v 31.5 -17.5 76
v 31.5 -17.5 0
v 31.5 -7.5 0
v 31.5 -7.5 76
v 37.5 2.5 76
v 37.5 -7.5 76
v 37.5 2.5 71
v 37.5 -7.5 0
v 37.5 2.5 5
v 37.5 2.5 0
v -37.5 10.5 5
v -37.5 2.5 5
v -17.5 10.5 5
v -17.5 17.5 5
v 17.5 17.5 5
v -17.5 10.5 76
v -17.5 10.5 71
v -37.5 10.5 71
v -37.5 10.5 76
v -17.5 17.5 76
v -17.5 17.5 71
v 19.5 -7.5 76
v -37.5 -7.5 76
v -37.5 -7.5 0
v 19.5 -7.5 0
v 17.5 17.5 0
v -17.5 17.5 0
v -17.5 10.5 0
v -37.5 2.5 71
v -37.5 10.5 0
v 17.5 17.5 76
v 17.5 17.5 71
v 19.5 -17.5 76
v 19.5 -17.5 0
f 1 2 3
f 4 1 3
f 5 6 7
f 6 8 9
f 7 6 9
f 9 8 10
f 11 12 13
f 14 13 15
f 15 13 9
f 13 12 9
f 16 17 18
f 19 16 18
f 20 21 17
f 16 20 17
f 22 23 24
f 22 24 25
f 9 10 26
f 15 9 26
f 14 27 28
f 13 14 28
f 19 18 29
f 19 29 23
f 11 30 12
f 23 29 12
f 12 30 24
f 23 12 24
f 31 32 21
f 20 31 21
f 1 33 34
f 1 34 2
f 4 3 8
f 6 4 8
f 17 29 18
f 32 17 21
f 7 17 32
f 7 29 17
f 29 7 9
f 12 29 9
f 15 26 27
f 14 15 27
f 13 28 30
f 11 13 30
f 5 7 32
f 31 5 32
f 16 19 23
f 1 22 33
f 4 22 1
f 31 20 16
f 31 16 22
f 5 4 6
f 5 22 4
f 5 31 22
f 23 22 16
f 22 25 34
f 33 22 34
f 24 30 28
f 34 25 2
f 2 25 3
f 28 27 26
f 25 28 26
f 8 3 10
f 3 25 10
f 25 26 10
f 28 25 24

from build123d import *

# Parameters (mm, degrees)
EXTRUDE_1_DEPTH     = 76
SKETCH_2_W          = 66
SKETCH_2_H          = 15
CUT_EXTRUDE_1_DEPTH = 109.200046211


with BuildPart() as part:
    # Эскиз1 → Бобышка-Вытянуть1 (new body)
    with BuildSketch(Plane.XY):
        Polygon((37.5, 2.5), (17.5, 17.5), (-17.5, 17.5), (-17.5, 10.5), (-37.5, 10.5), (-37.5, -7.5), (19.5, -7.5), (19.5, -17.5), (31.5, -17.5), (31.5, -7.5), (37.5, -7.5), align=None)
    extrude(amount=EXTRUDE_1_DEPTH)

    # Эскиз2 → Вырез-Вытянуть1 (cut, through all)
    with BuildSketch(Plane(origin=(37.5, 0, 0), x_dir=(0, 0, -1), z_dir=(1, 0, 0))):
        with Locations((-38, 10)):
            Rectangle(SKETCH_2_W, SKETCH_2_H)
    extrude(amount=-CUT_EXTRUDE_1_DEPTH, mode=Mode.SUBTRACT)


solid = part.part
